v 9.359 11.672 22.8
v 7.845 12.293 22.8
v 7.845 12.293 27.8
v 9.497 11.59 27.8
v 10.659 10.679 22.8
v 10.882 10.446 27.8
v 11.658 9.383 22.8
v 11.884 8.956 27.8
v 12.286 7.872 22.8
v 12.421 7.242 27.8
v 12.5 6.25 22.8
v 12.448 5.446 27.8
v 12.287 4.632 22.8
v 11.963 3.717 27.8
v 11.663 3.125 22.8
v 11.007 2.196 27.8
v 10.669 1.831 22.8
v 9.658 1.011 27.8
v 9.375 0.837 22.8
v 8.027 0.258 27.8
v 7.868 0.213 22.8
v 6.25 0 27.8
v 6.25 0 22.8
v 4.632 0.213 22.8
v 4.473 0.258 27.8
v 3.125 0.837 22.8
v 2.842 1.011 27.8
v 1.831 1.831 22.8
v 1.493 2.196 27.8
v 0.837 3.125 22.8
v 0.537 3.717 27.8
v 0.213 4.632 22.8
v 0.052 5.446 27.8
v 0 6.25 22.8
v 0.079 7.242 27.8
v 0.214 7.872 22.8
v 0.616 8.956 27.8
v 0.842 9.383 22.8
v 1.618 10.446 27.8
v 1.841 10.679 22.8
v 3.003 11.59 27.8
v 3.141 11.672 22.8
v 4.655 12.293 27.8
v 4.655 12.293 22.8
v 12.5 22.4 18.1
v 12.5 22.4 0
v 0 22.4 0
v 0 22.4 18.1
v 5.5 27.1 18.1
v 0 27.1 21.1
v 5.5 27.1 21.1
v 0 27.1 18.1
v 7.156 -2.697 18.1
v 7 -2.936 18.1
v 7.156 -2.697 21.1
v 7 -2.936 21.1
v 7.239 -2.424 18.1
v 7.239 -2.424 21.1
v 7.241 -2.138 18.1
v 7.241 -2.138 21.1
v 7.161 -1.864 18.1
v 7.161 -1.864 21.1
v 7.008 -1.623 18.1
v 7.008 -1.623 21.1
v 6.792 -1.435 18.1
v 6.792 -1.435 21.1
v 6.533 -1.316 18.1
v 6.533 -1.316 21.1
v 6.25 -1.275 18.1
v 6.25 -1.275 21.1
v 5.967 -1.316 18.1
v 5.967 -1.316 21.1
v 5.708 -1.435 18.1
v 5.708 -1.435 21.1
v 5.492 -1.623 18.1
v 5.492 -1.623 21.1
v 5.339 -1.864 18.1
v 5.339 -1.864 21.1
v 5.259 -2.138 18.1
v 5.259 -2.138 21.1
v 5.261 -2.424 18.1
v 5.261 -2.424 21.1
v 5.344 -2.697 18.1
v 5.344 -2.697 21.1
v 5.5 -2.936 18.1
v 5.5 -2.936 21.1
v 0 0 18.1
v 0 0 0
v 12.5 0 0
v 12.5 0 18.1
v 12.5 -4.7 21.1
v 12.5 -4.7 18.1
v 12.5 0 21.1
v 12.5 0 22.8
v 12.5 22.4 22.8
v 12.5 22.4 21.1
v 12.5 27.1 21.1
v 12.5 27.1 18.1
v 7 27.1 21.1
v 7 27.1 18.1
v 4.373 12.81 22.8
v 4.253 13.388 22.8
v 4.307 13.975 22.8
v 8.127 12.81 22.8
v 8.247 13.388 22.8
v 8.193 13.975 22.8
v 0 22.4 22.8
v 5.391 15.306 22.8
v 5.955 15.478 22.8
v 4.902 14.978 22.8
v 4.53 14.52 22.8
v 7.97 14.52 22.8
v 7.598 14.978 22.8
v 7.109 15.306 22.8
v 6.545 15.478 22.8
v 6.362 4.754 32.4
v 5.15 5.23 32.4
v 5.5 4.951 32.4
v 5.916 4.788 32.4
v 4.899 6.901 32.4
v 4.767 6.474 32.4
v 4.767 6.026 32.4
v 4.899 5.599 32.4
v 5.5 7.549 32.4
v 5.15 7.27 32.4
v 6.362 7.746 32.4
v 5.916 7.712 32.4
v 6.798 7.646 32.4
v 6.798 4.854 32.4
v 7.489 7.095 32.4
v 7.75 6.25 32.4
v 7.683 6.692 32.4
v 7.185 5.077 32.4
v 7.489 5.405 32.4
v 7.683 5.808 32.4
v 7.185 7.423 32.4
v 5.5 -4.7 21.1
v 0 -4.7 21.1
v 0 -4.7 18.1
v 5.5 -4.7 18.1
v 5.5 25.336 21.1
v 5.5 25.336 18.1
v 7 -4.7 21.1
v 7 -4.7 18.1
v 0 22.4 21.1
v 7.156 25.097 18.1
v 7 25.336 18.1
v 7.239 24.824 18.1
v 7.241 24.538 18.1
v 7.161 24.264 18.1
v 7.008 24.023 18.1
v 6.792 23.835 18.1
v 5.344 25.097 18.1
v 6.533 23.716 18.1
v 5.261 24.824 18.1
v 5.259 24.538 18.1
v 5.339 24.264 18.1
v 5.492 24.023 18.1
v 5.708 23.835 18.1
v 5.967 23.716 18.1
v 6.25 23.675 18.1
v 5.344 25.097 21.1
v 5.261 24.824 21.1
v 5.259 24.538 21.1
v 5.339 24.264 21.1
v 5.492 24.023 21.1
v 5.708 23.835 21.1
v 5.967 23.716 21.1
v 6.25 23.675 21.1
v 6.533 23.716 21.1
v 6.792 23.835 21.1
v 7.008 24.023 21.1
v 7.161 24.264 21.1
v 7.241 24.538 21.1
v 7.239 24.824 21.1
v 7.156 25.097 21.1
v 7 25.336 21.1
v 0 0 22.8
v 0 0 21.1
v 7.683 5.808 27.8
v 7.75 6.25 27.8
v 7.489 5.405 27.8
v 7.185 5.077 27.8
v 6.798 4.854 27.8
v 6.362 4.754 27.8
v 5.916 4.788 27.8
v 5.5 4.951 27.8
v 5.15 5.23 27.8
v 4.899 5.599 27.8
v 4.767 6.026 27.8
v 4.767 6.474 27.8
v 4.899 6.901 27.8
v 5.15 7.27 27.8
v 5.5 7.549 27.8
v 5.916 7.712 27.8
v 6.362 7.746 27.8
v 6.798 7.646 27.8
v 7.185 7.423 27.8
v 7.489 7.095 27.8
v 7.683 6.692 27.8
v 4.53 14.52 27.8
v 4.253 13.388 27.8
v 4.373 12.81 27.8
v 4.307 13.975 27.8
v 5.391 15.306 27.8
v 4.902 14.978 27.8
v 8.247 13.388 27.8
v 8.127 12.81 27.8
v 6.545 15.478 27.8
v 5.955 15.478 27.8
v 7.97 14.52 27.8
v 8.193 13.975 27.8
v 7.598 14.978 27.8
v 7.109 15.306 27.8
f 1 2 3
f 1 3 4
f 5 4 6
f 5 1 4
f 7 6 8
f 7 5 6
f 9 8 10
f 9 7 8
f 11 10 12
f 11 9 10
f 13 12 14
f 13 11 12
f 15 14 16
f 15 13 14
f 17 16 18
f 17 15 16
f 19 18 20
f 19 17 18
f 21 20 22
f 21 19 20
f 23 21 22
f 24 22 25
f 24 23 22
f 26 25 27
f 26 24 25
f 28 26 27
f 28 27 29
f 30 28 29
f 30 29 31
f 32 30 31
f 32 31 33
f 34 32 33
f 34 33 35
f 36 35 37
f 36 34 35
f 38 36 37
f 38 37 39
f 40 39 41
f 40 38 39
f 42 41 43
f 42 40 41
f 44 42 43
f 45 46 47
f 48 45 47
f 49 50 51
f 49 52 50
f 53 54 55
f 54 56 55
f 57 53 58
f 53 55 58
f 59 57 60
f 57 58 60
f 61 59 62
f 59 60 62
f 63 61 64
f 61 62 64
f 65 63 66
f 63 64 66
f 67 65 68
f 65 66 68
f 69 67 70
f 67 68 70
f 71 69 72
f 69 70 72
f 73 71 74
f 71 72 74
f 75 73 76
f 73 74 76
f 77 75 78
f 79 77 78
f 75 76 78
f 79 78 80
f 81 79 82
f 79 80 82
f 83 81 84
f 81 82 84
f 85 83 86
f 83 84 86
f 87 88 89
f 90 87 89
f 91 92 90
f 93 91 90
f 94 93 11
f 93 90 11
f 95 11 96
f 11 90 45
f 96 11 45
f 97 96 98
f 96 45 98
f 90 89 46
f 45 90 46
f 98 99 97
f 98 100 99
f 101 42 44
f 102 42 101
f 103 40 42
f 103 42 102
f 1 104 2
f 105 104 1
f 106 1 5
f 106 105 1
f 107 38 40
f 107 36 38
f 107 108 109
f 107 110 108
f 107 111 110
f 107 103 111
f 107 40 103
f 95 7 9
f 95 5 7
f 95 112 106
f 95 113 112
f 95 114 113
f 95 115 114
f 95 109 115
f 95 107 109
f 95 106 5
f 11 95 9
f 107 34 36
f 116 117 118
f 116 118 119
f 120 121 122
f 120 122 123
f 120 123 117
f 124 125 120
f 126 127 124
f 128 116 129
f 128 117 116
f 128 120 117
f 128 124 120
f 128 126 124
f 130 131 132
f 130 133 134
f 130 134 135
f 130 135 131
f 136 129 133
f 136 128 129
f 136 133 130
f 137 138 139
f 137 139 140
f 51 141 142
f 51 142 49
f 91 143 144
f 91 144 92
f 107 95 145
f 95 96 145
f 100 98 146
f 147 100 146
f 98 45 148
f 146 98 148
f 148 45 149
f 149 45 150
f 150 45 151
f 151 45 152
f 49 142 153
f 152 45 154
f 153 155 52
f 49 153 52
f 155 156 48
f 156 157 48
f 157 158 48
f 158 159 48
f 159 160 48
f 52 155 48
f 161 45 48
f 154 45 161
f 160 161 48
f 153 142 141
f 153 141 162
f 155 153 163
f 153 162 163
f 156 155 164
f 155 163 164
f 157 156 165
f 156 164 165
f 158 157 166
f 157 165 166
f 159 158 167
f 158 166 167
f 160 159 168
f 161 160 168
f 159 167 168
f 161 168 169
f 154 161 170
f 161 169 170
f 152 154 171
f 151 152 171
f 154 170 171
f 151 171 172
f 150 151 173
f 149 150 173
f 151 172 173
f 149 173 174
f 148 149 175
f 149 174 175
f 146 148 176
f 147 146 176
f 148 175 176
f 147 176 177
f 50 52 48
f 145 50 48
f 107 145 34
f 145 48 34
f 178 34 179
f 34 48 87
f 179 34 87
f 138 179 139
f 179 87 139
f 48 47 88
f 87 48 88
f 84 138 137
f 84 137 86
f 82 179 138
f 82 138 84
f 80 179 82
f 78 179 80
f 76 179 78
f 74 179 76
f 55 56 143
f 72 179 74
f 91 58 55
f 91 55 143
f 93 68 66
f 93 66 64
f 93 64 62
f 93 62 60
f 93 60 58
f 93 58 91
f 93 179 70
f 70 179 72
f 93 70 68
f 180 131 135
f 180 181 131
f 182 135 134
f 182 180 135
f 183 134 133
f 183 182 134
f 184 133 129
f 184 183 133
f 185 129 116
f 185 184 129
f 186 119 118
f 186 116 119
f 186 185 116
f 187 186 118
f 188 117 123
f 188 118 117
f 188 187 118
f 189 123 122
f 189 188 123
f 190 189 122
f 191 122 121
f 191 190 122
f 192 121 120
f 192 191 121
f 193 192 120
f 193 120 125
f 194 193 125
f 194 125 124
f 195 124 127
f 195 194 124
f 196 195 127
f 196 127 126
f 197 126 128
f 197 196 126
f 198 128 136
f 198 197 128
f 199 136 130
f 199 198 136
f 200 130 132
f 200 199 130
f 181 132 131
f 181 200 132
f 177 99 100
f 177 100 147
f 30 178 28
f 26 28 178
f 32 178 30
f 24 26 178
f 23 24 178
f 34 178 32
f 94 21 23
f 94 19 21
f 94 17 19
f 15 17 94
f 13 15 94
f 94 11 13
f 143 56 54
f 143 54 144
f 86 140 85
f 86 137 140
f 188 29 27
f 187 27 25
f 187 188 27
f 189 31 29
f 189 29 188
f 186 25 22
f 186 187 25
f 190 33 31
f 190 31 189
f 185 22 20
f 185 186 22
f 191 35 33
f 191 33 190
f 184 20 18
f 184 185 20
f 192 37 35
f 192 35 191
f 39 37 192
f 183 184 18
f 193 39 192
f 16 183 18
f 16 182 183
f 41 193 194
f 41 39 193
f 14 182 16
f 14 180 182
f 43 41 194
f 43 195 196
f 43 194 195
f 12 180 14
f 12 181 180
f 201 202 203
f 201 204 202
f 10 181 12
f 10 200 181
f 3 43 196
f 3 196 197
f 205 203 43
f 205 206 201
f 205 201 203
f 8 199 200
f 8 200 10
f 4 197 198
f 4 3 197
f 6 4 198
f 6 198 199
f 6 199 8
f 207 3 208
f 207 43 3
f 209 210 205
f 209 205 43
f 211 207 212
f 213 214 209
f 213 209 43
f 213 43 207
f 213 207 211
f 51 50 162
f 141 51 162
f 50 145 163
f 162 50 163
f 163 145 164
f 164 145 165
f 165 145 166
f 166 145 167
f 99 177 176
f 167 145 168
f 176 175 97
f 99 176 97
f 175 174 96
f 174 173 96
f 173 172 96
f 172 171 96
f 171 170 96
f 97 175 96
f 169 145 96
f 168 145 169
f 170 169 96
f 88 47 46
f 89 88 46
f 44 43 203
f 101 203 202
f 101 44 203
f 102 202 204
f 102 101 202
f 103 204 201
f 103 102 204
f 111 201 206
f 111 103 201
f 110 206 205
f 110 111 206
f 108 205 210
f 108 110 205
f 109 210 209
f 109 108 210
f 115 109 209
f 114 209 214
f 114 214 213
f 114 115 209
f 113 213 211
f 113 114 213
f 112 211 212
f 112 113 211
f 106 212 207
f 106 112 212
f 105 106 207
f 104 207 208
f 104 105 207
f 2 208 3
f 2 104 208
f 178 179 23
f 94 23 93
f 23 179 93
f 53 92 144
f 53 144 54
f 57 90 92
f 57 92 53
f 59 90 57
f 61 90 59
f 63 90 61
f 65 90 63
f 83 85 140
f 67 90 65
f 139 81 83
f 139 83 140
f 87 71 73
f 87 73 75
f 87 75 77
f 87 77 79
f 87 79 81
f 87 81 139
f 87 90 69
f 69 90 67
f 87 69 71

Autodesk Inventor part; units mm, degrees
ref_plane "YZ Plane" through (0, 0, 0) normal (1, 0, 0) x (0, 1, 0)
ref_plane "XZ Plane" through (0, 0, 0) normal (0, 1, 0) x (-1, 0, 0)
ref_plane "XY Plane" through (0, 0, 0) normal (0, 0, 1) x (1, 0, 0)
sketch "Эскиз2" plane through (0, 0, 0) normal (0, 0, 1) x (1, 0, 0)
  line L0 (0, 0) -> (12.5, 0)
  line L1 (12.5, 0) -> (12.5, 22.4)
  line L2 (12.5, 22.4) -> (0, 22.4)
  line L3 (0, 22.4) -> (0, 0)
  dimension "d0" = 12.5
  dimension "d1" = 22.4
extrude "Выдавливание1" add sketch "Эскиз2" along normal blind 22.8
sketch "Эскиз3" plane through (0, 22.4, 0) normal (0, 1, 0) x (1, 0, 0)
  line L0 (12.5, 0) -> (0, 0) projected
  line L1 (12.5, 0) -> (12.5, -18.1)
  line L2 (12.5, 0) -> (12.5, -22.8) projected
  line L3 (0, 0) -> (0, -22.8) projected
  line L4 (12.5, -18.1) -> (0, -18.1)
  line L5 (0, -18.1) -> (0, -21.1)
  line L6 (0, -21.1) -> (12.5, -21.1)
  line L7 (12.5, -21.1) -> (12.5, -18.1)
  point P0 (12.5, -21.1)
  point P1 (0, -18.1)
  dimension "d4" = 18.1
  dimension "d5" = 3
extrude "Выдавливание2" add sketch "Эскиз3" along normal blind 4.7 contours L2 L6 L3 L4
sketch "Эскиз4" plane through (0, 0, 0) normal (0, -1, 0) x (1, 0, 0)
  line L0 (12.2114, 0) -> (12.5, 16.0974)
  line L1 (12.5, 0) -> (12.5, 22.8) projected
  line L2 (12.5, 21.1) -> (12.5, 18.1) projected
  line L3 (0, 18.1) -> (0, 21.1) projected
  line L4 (12.5, 18.1) -> (0, 18.1)
  line L5 (0, 18.1) -> (0, 21.1)
  line L6 (0, 21.1) -> (12.5, 21.1)
  line L7 (12.5, 21.1) -> (12.5, 18.1)
  point P0 (0, 0)
  point P1 (12.5, 21.1)
  point P2 (0, 18.1)
  dimension "d8" = 16.1
  dimension "d9" = 3
extrude "Выдавливание3" add sketch "Эскиз4" along normal blind 4.7
sketch "Эскиз5" plane through (0, 0, 21.1) normal (0, 0, 1) x (1, 0, 0)
  line L0 (0, -4.7) -> (12.5, -4.7) projected
  line L1 (6.25, -4.7) -> (6.25, -2.275)
  line L2 (12.5, 27.1) -> (0, 27.1) projected
  line L3 (6.25, 27.1) -> (6.25, 24.675)
  circle A0 centre (6.25, -2.275) radius 1
  circle A1 centre (6.25, 24.675) radius 1
  line L4 (6.25, -2.275) -> (7, -2.275)
  line L5 (7, -2.275) -> (7, -4.7)
  line L6 (7, -4.7) -> (6.25, -4.7)
  line L7 (6.25, -4.7) -> (6.25, -2.275)
  line L8 (6.25, -4.7) -> (5.5, -4.7)
  line L9 (5.5, -4.7) -> (5.5, -2.275)
  line L10 (5.5, -2.275) -> (6.25, -2.275)
  line L11 (6.25, -2.275) -> (6.25, -4.7)
  line L12 (6.25, 27.1) -> (7, 27.1)
  line L13 (7, 27.1) -> (7, 24.675)
  line L14 (7, 24.675) -> (6.25, 24.675)
  line L15 (6.25, 24.675) -> (6.25, 27.1)
  line L16 (6.25, 24.675) -> (5.5, 24.675)
  line L17 (5.5, 24.675) -> (5.5, 27.1)
  line L18 (5.5, 27.1) -> (6.25, 27.1)
  line L19 (6.25, 27.1) -> (6.25, 24.675)
  point P0 (0, 0)
  point P1 (5.5, 25.3364)
  point P2 (7, 25.3364)
  point P3 (5.5, -2.9364)
  point P4 (7, -2.9364)
  dimension "d12" = 2.425
  dimension "d13" = 2.425
  dimension "d14" = 2
  dimension "d15" = 2
  dimension "d16" = 0.75
  dimension "d17" = 0.75
  dimension "d18" = 0.75
  dimension "d19" = 0.75
extrude "Выдавливание4" cut sketch "Эскиз5" against normal through all
sketch "Эскиз6" plane through (0, 0, 22.8) normal (0, 0, 1) x (1, 0, 0)
  line L0 (12.5, 0) -> (0, 0) projected
  line L1 (6.25, 0) -> (6.25, 6.25)
  circle A0 centre (6.25, 6.25) radius 6.25
  line L2 (6.25, 6.25) -> (6.25, 13.5)
  circle A1 centre (6.25, 13.5) radius 2
  point P0 (7.8448, 12.2931)
  dimension "d22" = 6.25
  dimension "d23" = 12.5
  dimension "d24" = 7.25
  dimension "d25" = 4
extrude "Выдавливание5" add sketch "Эскиз6" along normal blind 5
sketch "Эскиз7" plane through (0, 0, 27.8) normal (0, 0, 1) x (1, 0, 0)
  arc A0 (4.6552, 12.2931) -> (0, 6.25) centre (6.25, 6.25) ccw projected
  circle A1 centre (6.25, 6.25) radius 1.5
  point P0 (0, 0)
  dimension "d28" = 3
extrude "Выдавливание6" add sketch "Эскиз7" along normal blind 4.6
properties part number "Сервопривод SG90"
